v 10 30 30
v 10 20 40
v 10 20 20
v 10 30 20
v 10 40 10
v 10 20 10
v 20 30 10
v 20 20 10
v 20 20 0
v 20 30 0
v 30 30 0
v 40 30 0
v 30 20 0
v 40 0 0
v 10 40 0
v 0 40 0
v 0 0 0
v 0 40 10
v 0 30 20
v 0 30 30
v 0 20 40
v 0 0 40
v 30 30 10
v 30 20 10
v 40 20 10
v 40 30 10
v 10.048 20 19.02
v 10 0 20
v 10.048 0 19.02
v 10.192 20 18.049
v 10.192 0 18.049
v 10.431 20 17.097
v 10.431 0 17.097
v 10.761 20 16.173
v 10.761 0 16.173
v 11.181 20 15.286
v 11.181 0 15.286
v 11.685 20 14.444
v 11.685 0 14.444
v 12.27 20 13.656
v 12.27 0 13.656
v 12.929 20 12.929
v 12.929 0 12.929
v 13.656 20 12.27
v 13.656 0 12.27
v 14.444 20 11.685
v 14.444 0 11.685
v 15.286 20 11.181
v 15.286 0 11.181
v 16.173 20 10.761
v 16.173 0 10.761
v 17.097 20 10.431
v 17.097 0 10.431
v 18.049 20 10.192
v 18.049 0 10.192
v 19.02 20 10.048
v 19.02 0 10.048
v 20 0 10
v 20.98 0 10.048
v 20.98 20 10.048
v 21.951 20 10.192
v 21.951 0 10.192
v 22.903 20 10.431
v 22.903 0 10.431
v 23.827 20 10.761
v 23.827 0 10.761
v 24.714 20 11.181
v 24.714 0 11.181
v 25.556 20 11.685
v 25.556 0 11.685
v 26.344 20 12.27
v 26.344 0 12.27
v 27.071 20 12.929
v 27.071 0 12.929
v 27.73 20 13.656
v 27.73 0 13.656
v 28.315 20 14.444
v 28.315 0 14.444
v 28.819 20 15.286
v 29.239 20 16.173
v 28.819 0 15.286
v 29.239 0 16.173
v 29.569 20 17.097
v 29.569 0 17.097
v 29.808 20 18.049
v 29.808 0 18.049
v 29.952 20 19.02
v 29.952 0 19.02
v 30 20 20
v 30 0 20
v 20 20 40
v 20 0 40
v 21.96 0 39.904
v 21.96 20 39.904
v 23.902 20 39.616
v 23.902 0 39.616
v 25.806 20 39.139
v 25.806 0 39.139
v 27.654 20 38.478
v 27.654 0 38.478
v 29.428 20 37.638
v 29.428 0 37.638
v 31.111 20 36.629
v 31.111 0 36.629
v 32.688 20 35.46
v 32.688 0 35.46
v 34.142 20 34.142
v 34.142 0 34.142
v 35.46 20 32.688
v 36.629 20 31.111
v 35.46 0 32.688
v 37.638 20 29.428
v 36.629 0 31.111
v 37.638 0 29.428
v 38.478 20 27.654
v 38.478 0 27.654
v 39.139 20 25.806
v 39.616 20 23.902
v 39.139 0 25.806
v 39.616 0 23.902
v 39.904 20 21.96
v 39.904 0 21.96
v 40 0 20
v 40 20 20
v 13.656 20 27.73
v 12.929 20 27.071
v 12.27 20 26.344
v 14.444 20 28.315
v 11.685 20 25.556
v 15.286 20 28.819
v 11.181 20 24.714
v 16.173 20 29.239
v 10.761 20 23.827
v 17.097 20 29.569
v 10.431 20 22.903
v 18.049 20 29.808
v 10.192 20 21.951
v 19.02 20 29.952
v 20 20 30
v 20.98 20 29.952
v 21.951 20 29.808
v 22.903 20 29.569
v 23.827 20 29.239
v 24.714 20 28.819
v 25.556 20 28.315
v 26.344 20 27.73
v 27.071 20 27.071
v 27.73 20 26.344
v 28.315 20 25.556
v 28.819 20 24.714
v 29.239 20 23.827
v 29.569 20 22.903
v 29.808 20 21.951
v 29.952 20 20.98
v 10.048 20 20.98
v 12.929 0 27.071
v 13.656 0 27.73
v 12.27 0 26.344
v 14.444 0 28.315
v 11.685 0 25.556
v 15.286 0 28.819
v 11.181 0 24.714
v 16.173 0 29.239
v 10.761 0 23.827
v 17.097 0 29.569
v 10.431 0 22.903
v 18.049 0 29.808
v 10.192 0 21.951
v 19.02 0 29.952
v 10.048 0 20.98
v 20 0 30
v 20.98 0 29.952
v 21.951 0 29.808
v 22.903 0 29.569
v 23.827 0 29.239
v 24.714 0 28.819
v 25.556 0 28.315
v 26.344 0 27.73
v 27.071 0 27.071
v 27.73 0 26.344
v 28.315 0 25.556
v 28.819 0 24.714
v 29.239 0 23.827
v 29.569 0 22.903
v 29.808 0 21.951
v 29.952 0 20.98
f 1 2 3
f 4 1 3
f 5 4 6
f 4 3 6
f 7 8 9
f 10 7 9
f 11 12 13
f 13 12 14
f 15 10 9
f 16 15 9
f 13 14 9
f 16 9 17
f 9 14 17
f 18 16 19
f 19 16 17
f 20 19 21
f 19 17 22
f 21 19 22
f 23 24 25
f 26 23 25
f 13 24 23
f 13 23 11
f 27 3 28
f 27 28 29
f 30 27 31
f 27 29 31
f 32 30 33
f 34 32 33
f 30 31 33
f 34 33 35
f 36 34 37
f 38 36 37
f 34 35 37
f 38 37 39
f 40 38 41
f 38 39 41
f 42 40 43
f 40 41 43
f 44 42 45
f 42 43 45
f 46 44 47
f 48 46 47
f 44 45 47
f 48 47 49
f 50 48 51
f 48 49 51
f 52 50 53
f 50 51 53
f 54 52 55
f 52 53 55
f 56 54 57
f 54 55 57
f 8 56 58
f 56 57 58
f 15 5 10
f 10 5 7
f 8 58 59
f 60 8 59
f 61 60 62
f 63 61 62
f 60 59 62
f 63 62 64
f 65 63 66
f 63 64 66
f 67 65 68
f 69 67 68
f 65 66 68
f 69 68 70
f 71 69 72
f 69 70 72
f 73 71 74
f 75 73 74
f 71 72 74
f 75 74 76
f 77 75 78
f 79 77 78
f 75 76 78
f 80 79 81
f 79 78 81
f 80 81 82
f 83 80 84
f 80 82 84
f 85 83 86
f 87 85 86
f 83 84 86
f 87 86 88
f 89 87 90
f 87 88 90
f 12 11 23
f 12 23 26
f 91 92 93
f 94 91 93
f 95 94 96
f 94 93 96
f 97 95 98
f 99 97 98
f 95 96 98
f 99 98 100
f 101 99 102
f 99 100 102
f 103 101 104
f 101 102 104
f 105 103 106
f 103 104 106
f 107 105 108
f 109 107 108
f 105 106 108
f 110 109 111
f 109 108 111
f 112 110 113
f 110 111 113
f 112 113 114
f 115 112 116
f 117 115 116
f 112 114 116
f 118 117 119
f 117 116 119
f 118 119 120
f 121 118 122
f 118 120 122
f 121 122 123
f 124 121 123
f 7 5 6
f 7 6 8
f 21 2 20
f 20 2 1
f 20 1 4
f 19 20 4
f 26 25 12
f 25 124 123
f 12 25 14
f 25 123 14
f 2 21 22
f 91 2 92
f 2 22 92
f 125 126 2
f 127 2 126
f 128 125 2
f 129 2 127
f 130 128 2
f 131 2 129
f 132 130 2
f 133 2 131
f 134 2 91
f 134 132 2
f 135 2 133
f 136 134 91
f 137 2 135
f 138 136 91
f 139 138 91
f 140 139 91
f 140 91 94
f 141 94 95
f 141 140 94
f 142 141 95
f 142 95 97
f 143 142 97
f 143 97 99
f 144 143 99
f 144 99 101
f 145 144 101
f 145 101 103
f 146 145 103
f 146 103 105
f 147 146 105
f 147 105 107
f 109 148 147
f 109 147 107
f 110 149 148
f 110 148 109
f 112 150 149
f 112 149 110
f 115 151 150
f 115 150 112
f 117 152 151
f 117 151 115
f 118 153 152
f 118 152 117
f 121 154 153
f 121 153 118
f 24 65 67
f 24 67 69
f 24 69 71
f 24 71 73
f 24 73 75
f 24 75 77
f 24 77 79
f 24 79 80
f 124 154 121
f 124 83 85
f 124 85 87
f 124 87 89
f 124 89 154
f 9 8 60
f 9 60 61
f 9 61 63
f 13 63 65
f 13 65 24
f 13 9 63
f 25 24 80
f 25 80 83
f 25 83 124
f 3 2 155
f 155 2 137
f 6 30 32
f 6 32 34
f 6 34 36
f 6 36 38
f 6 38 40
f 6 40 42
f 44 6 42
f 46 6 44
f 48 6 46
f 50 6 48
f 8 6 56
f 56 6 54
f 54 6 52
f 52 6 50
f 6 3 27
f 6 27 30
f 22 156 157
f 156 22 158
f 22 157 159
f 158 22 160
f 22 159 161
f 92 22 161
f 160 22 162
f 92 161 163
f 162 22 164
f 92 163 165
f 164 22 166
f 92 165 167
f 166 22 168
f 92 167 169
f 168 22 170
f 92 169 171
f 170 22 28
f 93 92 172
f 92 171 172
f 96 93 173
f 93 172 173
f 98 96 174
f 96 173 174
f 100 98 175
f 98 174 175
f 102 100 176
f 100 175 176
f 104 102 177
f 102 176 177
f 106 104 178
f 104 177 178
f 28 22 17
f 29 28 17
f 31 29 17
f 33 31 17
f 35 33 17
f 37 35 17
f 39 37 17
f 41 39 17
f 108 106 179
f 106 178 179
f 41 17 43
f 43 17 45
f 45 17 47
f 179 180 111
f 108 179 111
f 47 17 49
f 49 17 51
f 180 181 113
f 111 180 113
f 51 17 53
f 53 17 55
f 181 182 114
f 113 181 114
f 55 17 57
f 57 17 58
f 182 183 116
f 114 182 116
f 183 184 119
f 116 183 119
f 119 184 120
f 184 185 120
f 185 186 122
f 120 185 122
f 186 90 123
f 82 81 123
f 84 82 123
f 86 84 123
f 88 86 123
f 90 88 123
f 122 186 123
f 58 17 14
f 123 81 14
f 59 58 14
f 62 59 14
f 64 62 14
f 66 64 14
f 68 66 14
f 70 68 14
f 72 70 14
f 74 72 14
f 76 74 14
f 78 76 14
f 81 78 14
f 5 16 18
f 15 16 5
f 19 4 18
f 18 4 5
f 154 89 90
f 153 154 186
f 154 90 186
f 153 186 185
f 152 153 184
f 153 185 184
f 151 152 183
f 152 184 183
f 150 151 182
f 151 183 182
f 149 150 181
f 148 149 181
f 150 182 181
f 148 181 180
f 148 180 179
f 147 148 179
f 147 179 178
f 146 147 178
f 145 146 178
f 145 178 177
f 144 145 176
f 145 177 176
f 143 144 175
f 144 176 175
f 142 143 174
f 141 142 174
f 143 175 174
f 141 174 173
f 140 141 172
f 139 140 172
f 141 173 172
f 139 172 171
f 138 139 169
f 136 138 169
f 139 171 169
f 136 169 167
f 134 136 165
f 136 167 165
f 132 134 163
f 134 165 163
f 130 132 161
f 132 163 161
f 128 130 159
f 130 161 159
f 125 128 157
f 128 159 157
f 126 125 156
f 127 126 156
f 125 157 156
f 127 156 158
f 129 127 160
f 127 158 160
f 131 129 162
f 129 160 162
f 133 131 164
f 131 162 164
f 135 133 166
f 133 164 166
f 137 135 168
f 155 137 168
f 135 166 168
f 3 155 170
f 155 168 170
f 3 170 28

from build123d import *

# Parameters (mm, degrees)
SKETCH1_W               = 10
SKETCH1_H               = 10
BOSS_EXTRUDE1_DEPTH     = 20
SKETCH1_3_W             = 10
SKETCH1_3_H             = 10
BOSS_EXTRUDE2_DEPTH     = 30
SKETCH1_4_W             = 10
SKETCH1_4_H             = 10
BOSS_EXTRUDE3_DEPTH     = 40
CUT_EXTRUDE1_DEPTH      = 31
CUT_EXTRUDE1_DEPTH_BACK = 10
CUT_EXTRUDE2_DEPTH      = 31
CUT_EXTRUDE2_DEPTH_BACK = 10


with BuildPart() as part:
    # Sketch1 → Boss-Extrude1 (new body)
    with BuildSketch(Plane(origin=(0, 0, 0), x_dir=(1, 0, 0), z_dir=(0, 1, 0))):
        Polygon((10, 0), (0, 0), (0, -40), (10, -40), (10, -20), (10, -10), align=None)
        with BuildLine():
            Line((10, -20), (10, -40))
            Line((10, -40), (20, -40))
            ThreePointArc((20, -40), (34.142135624, -34.142135624), (40, -20))
            Line((40, -20), (40, -10))
            Line((40, -10), (30, -10))
            Line((30, -10), (30, 0))
            Line((30, 0), (20, 0))
            Line((20, 0), (20, -10))
            ThreePointArc((20, -10), (27.071067812, -12.928932188), (30, -20))
            ThreePointArc((30, -20), (20, -30), (10, -20))
        make_face()
        with Locations((15, -5)):
            Rectangle(SKETCH1_W, SKETCH1_H)
        with Locations((35, -5)):
            Rectangle(SKETCH1_W, SKETCH1_H)
        with BuildLine():
            Line((20, -10), (10, -10))
            Line((10, -10), (10, -20))
            ThreePointArc((10, -20), (12.928932188, -12.928932188), (20, -10))
        make_face()
    extrude(amount=BOSS_EXTRUDE1_DEPTH)

    # Sketch1<3> → Boss-Extrude2 (add)
    with BuildSketch(Plane(origin=(0, 0, 0), x_dir=(1, 0, 0), z_dir=(0, 1, 0))):
        with Locations((35, -5)):
            Rectangle(SKETCH1_3_W, SKETCH1_3_H)
    extrude(amount=BOSS_EXTRUDE2_DEPTH)

    # Sketch1<4> → Boss-Extrude3 (add)
    with BuildSketch(Plane(origin=(0, 0, 0), x_dir=(1, 0, 0), z_dir=(0, 1, 0))):
        with Locations((15, -5)):
            Rectangle(SKETCH1_4_W, SKETCH1_4_H)
        Polygon((10, 0), (0, 0), (0, -40), (10, -40), (10, -20), (10, -10), align=None)
    extrude(amount=BOSS_EXTRUDE3_DEPTH)

    # Sketch2 → Cut-Extrude1 (cut, two sides)
    with BuildSketch(Plane.XY.offset(10)) as cut_extrude1_sk:
        Polygon((20, 40), (10, 40), (20, 30), align=None)
    extrude(amount=CUT_EXTRUDE1_DEPTH, mode=Mode.SUBTRACT)
    extrude(cut_extrude1_sk.sketch, amount=-CUT_EXTRUDE1_DEPTH_BACK, mode=Mode.SUBTRACT)

    # Sketch3 → Cut-Extrude2 (cut, two sides)
    with BuildSketch(Plane(origin=(10, 0, 0), x_dir=(0, 0, -1), z_dir=(1, 0, 0))) as cut_extrude2_sk:
        Polygon((-117.781745931, -57.781745931), (-40, 20), (-30, 30), (-20, 30), (-10, 40), (67.781745931, 117.781745931), (-83.416065326, 277.591701412), (-268.979557187, 102.028209551), align=None)
    extrude(amount=CUT_EXTRUDE2_DEPTH, mode=Mode.SUBTRACT)
    extrude(cut_extrude2_sk.sketch, amount=-CUT_EXTRUDE2_DEPTH_BACK, mode=Mode.SUBTRACT)


solid = part.part
